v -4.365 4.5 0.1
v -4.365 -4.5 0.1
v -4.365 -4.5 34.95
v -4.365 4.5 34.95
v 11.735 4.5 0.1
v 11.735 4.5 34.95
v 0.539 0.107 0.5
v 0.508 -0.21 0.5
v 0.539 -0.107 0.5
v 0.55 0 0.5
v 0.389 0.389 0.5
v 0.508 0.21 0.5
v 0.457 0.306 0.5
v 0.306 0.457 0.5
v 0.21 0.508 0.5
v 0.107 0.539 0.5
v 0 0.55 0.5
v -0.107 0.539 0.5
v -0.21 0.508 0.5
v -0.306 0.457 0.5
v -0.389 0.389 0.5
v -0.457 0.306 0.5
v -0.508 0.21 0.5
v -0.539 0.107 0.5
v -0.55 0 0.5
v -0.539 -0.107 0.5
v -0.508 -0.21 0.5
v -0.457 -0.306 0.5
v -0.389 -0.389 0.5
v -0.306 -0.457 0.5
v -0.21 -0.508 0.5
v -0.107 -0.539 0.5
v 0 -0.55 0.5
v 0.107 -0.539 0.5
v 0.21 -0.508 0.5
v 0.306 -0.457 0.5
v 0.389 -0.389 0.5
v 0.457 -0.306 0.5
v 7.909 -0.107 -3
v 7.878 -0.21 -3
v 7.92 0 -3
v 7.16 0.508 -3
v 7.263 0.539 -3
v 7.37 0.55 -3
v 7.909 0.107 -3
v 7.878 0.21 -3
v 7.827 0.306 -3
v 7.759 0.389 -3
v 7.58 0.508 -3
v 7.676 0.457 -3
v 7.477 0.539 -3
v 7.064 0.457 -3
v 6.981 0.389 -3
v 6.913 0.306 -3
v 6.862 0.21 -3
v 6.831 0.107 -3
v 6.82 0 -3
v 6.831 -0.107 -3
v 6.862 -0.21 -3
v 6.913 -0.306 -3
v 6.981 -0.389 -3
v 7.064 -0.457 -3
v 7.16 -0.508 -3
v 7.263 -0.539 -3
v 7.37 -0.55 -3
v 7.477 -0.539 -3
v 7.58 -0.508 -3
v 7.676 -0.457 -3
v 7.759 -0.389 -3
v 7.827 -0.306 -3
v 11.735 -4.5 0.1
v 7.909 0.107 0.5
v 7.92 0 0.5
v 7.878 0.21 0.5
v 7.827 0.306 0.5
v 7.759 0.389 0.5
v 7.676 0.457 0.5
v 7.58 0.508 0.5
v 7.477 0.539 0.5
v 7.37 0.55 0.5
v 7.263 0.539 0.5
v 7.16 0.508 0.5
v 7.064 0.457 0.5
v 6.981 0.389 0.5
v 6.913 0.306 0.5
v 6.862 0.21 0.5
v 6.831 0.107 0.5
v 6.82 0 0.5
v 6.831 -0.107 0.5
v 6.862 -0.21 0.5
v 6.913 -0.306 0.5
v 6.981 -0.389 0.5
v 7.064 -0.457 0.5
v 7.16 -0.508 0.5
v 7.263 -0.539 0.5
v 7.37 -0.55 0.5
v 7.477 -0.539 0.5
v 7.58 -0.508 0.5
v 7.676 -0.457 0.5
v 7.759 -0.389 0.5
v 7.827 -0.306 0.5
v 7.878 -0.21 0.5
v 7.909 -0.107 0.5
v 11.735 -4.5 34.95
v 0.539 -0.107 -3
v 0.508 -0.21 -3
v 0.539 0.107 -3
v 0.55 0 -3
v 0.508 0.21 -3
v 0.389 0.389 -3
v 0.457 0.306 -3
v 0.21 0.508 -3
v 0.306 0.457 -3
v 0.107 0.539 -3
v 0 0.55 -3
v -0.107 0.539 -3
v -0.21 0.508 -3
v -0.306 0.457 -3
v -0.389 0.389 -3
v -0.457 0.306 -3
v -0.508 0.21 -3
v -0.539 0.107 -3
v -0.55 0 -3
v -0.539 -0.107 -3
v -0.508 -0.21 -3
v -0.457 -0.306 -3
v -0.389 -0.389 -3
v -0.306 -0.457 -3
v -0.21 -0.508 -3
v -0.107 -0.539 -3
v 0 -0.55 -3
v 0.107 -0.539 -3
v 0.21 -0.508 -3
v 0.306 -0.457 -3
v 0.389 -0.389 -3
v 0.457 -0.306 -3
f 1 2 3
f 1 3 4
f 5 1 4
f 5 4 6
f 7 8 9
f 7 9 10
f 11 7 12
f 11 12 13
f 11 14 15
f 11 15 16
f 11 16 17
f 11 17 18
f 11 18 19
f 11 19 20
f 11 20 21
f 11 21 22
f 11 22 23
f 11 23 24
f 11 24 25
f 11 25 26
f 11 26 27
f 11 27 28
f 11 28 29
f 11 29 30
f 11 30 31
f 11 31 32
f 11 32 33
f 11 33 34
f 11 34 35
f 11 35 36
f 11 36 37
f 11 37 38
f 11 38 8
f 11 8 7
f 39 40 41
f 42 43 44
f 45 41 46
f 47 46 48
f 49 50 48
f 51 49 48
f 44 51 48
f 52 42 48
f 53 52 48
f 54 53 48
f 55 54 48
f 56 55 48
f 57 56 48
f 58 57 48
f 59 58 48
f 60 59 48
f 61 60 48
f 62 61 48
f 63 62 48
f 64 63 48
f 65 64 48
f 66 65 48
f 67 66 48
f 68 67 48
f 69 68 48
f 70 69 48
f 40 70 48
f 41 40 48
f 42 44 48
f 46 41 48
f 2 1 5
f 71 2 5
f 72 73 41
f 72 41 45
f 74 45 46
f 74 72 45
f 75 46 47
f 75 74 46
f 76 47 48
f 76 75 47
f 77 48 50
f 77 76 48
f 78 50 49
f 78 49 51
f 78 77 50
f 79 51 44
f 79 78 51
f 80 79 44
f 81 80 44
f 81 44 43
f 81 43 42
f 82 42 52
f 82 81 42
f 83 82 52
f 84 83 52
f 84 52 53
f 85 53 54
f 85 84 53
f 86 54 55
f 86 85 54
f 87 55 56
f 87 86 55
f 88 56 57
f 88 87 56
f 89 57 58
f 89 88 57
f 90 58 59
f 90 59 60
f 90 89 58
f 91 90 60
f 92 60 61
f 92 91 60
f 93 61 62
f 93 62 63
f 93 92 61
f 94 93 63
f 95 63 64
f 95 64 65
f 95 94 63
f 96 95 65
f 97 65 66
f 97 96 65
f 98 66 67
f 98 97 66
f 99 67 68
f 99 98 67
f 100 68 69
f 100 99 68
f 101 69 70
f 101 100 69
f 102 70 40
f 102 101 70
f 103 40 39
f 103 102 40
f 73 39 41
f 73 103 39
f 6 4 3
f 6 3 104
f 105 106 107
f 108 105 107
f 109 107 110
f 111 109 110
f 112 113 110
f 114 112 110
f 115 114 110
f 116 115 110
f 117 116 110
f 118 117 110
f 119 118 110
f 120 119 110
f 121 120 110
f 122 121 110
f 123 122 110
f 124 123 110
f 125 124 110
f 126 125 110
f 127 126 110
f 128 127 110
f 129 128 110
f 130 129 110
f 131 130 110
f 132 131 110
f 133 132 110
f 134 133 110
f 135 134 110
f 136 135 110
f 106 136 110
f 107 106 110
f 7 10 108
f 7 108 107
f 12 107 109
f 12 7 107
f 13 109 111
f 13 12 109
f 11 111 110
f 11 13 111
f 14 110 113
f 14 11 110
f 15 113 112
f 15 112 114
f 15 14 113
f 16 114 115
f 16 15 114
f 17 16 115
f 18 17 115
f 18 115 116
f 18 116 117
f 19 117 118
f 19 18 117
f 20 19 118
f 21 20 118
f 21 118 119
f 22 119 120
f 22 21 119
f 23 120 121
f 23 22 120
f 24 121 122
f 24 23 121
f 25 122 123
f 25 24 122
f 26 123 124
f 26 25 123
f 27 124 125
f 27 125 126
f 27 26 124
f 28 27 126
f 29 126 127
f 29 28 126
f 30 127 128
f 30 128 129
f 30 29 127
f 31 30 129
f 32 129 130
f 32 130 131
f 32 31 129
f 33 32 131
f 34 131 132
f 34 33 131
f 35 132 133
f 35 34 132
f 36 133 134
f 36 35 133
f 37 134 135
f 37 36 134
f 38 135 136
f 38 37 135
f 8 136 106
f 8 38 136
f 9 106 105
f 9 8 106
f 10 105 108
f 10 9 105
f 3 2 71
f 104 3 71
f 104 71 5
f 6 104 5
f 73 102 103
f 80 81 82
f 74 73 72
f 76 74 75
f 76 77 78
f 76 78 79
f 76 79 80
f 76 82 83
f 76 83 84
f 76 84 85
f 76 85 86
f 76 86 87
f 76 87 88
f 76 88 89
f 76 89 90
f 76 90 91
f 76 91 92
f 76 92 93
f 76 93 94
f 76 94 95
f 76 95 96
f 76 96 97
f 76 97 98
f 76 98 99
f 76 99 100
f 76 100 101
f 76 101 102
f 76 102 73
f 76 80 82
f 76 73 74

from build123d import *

# Parameters (mm, degrees)
SKETCH_W     = 16.1
SKETCH_H     = 9
PAD_DEPTH    = 34.85
SKETCH001_R  = 0.55
PAD001_DEPTH = 3.5


with BuildPart() as pad:
    # Sketch → Pad (new body)
    with BuildSketch(Plane.XY.offset(0.1)):
        with Locations((3.685, 0)):
            Rectangle(SKETCH_W, SKETCH_H)
    extrude(amount=PAD_DEPTH)


with BuildPart() as pad001:
    # Sketch001 → Pad001 (new body)
    with BuildSketch(Plane.XY.offset(0.5)):
        Circle(SKETCH001_R)
        with Locations((7.37, 0)):
            Circle(SKETCH001_R)
    extrude(amount=-PAD001_DEPTH)


solid = Compound([pad.part, pad001.part])
